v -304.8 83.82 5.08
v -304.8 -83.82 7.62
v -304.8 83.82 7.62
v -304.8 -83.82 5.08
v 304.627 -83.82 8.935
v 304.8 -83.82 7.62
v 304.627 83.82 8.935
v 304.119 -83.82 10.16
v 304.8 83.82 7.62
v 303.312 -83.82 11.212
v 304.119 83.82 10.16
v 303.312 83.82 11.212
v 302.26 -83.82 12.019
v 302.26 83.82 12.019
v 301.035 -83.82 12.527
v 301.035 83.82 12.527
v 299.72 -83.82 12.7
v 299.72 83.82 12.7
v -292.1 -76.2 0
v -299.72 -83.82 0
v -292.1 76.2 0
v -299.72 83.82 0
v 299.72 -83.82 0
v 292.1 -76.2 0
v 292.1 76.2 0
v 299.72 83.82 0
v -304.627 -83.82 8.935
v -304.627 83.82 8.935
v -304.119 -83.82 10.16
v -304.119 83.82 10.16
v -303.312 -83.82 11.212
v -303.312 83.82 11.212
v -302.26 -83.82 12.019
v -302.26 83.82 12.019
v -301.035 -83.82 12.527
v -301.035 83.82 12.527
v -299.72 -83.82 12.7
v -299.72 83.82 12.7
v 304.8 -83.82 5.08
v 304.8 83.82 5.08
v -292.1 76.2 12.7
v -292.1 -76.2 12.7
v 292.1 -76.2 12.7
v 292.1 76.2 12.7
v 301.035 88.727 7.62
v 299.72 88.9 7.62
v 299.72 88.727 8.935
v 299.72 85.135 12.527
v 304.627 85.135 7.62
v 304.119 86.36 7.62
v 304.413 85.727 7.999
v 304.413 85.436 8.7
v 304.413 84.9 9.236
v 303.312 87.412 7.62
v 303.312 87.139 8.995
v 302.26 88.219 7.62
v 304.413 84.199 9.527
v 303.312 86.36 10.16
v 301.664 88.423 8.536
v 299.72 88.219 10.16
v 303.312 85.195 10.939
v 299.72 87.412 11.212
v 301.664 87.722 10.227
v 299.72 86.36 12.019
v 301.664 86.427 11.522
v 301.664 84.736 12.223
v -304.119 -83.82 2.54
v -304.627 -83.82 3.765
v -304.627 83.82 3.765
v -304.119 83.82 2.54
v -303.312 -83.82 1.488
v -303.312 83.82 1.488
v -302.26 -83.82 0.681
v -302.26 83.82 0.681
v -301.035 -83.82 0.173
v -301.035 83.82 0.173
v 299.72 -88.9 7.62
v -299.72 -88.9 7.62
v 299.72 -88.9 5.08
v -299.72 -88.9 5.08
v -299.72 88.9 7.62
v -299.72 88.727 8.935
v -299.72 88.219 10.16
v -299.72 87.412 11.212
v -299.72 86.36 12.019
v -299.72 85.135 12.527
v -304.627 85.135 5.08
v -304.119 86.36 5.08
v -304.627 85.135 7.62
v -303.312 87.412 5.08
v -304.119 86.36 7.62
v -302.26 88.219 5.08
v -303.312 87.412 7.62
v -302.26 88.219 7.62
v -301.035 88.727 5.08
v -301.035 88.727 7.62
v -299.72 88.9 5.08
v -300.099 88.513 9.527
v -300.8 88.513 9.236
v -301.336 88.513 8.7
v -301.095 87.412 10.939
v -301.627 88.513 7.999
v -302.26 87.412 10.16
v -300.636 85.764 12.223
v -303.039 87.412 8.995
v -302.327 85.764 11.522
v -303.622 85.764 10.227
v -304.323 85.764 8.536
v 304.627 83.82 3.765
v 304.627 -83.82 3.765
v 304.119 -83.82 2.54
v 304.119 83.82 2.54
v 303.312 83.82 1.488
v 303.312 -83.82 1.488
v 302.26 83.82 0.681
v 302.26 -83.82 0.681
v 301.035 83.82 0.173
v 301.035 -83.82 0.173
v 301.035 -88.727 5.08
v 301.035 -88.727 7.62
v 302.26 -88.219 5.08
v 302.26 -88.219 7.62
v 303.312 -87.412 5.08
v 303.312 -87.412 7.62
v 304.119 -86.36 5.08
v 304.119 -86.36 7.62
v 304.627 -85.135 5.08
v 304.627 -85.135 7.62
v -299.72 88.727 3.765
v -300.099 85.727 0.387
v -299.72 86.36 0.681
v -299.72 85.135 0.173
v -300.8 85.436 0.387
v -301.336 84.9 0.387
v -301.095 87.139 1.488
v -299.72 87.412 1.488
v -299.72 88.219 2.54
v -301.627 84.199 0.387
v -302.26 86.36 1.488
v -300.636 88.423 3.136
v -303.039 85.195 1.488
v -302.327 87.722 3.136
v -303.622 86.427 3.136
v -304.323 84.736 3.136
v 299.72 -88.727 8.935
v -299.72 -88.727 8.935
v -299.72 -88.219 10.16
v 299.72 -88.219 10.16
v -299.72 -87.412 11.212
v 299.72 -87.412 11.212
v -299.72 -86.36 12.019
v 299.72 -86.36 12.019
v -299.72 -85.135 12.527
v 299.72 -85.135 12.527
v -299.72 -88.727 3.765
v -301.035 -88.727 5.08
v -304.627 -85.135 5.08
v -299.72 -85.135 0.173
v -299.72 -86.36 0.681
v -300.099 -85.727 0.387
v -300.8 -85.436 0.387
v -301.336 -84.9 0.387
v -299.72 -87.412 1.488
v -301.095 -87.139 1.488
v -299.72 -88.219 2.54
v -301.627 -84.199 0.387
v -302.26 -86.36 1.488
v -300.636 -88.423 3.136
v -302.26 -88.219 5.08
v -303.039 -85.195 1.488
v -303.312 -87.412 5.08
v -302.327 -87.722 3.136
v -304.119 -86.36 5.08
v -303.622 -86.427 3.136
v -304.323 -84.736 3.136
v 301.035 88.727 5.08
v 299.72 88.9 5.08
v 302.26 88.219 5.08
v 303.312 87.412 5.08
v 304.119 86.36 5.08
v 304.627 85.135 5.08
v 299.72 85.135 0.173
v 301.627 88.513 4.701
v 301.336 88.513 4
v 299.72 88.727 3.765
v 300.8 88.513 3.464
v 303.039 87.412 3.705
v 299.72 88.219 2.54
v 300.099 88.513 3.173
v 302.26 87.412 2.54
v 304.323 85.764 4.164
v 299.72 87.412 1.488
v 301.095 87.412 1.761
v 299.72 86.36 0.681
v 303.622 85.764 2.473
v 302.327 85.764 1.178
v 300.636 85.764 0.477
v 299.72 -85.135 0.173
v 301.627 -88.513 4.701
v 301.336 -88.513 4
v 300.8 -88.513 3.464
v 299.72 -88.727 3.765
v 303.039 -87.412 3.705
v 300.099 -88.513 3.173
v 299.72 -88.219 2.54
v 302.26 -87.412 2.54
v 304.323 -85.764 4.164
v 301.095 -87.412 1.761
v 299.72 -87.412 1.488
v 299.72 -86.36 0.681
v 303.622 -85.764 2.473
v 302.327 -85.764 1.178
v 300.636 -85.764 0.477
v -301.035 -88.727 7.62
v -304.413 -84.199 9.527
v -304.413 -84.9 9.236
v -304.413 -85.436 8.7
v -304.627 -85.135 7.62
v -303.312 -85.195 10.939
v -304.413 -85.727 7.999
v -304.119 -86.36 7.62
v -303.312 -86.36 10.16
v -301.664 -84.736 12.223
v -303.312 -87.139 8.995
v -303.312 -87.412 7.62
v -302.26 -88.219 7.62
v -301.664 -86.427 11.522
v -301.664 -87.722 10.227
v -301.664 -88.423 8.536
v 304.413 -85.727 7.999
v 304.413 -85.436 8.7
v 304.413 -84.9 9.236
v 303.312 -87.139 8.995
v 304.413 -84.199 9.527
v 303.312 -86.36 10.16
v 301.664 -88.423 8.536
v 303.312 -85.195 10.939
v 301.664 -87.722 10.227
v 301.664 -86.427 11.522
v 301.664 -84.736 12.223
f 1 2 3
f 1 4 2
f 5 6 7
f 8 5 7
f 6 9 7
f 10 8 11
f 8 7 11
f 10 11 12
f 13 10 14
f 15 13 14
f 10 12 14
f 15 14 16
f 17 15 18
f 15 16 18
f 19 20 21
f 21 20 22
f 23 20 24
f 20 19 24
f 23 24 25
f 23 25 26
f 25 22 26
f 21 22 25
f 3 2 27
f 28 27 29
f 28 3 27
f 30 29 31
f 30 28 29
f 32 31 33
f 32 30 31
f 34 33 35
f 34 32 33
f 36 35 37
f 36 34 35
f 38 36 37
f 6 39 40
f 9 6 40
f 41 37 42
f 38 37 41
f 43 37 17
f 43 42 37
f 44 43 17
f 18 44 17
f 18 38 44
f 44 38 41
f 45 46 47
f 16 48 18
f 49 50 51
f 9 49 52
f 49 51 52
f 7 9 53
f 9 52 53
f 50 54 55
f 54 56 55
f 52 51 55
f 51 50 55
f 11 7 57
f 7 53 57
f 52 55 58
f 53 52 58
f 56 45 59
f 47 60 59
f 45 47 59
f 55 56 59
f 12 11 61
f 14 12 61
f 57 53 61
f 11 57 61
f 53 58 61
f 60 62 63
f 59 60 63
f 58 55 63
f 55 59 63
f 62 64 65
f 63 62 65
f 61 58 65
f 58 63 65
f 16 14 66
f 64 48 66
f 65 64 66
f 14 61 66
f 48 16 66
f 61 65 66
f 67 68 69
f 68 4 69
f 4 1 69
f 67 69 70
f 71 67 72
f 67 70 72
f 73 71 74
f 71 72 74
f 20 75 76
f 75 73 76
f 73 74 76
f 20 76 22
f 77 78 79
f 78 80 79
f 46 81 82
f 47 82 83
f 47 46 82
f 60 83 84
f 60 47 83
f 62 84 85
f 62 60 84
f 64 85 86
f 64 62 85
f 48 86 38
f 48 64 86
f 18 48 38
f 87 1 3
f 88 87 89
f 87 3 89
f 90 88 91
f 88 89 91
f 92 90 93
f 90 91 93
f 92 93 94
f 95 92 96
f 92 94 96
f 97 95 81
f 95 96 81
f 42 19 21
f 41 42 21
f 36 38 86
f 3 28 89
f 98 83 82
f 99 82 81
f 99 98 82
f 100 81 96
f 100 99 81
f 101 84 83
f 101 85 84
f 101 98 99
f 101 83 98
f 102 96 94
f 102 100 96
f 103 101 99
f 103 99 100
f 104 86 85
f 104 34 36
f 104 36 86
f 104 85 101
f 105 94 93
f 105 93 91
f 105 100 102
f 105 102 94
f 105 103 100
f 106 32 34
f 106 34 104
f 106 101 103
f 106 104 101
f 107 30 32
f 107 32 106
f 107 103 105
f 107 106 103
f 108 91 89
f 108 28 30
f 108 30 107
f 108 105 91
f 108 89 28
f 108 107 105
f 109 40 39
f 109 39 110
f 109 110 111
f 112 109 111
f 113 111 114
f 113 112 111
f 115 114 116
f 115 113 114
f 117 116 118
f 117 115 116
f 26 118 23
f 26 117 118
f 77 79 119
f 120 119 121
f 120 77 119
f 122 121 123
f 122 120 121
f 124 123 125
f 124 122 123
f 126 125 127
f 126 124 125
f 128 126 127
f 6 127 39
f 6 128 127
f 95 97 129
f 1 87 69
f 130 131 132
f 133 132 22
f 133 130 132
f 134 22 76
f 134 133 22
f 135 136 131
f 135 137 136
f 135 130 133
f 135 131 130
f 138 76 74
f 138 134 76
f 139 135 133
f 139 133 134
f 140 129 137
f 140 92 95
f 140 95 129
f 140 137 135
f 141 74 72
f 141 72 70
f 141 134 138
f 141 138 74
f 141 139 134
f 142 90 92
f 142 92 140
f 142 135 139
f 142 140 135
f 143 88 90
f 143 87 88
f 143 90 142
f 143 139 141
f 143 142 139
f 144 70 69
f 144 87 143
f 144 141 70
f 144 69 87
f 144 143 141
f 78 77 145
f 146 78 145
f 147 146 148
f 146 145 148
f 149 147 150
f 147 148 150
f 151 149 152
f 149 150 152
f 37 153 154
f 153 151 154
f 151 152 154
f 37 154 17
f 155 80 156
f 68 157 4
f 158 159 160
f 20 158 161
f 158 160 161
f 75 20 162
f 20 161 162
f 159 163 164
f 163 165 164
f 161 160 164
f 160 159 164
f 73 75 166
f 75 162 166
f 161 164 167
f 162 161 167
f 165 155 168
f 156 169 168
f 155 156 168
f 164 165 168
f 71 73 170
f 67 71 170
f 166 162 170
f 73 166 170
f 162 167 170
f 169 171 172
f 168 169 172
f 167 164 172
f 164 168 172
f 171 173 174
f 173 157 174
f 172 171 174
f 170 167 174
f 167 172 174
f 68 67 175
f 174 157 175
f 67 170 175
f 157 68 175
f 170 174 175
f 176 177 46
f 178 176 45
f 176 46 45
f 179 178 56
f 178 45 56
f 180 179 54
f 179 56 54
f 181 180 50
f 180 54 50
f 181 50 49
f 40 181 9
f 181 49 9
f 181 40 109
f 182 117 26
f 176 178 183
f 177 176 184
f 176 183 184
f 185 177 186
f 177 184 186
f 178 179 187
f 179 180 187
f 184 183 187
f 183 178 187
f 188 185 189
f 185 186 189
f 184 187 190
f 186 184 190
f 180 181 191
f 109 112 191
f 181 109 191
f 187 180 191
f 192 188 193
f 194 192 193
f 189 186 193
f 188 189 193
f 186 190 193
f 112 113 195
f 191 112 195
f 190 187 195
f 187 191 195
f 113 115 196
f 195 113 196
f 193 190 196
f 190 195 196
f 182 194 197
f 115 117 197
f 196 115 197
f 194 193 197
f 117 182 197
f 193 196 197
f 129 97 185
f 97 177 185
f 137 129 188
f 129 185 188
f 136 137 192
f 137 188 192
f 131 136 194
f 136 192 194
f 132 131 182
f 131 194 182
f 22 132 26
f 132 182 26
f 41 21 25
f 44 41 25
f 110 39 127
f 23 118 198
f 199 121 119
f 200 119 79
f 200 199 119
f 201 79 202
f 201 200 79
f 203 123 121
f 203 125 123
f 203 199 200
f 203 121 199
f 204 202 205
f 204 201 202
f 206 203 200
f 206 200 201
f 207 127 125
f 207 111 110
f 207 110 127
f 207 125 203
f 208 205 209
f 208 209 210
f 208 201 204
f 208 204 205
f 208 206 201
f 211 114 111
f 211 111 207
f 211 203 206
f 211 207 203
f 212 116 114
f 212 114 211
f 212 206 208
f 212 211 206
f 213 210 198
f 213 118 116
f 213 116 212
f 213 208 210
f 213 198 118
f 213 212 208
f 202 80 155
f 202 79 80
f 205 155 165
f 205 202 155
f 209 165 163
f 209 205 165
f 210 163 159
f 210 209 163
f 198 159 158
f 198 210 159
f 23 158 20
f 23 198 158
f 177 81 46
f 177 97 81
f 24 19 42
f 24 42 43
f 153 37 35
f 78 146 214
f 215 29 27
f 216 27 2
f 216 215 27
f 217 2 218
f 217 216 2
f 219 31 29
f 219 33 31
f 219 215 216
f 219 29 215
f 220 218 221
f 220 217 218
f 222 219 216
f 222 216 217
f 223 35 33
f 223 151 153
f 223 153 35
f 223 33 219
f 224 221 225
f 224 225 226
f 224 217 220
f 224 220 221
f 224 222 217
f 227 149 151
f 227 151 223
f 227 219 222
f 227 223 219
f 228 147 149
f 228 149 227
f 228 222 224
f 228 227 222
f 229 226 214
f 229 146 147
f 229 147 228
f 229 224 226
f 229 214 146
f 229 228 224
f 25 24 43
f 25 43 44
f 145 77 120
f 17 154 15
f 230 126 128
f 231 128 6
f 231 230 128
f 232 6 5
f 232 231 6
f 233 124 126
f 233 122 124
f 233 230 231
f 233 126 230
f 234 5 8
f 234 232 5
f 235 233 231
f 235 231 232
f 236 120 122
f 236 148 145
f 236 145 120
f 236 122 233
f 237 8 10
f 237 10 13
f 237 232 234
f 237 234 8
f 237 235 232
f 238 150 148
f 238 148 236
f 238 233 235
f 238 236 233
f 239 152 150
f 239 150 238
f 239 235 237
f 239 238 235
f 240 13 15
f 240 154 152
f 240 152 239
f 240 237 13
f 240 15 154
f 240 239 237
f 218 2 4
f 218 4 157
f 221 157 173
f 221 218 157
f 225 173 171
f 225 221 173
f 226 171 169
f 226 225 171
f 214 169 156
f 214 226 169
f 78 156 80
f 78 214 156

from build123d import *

# Parameters (mm, degrees)
F0_W     = 609.6
F0_H     = 177.8
F0_W_2   = 584.2
F0_H_2   = 152.4
F1_DEPTH = 12.7
F2_R     = 5.08


with BuildPart() as f1:
    # F0 (on Top) → F1 (new body)
    with BuildSketch(Plane.XY):
        Rectangle(F0_W, F0_H)
        Rectangle(F0_W_2, F0_H_2, mode=Mode.SUBTRACT)
    extrude(amount=F1_DEPTH)

    # F2
    f2_edges = [f1.edges().sort_by_distance(p)[0] for p in [
        (0, -88.9, 12.7),
        (-304.8, 0, 12.7),
        (304.8, 0, 0),
        (0, 88.9, 12.7),
        (304.8, 88.9, 6.35),
        (304.8, -88.9, 6.35),
        (-304.8, -88.9, 6.35),
        (-304.8, 88.9, 6.35),
        (304.8, 0, 12.7),
        (0, -88.9, 0),
        (0, 88.9, 0),
        (-304.8, 0, 0),
    ]]
    fillet(f2_edges, radius=F2_R)


solid = f1.part
